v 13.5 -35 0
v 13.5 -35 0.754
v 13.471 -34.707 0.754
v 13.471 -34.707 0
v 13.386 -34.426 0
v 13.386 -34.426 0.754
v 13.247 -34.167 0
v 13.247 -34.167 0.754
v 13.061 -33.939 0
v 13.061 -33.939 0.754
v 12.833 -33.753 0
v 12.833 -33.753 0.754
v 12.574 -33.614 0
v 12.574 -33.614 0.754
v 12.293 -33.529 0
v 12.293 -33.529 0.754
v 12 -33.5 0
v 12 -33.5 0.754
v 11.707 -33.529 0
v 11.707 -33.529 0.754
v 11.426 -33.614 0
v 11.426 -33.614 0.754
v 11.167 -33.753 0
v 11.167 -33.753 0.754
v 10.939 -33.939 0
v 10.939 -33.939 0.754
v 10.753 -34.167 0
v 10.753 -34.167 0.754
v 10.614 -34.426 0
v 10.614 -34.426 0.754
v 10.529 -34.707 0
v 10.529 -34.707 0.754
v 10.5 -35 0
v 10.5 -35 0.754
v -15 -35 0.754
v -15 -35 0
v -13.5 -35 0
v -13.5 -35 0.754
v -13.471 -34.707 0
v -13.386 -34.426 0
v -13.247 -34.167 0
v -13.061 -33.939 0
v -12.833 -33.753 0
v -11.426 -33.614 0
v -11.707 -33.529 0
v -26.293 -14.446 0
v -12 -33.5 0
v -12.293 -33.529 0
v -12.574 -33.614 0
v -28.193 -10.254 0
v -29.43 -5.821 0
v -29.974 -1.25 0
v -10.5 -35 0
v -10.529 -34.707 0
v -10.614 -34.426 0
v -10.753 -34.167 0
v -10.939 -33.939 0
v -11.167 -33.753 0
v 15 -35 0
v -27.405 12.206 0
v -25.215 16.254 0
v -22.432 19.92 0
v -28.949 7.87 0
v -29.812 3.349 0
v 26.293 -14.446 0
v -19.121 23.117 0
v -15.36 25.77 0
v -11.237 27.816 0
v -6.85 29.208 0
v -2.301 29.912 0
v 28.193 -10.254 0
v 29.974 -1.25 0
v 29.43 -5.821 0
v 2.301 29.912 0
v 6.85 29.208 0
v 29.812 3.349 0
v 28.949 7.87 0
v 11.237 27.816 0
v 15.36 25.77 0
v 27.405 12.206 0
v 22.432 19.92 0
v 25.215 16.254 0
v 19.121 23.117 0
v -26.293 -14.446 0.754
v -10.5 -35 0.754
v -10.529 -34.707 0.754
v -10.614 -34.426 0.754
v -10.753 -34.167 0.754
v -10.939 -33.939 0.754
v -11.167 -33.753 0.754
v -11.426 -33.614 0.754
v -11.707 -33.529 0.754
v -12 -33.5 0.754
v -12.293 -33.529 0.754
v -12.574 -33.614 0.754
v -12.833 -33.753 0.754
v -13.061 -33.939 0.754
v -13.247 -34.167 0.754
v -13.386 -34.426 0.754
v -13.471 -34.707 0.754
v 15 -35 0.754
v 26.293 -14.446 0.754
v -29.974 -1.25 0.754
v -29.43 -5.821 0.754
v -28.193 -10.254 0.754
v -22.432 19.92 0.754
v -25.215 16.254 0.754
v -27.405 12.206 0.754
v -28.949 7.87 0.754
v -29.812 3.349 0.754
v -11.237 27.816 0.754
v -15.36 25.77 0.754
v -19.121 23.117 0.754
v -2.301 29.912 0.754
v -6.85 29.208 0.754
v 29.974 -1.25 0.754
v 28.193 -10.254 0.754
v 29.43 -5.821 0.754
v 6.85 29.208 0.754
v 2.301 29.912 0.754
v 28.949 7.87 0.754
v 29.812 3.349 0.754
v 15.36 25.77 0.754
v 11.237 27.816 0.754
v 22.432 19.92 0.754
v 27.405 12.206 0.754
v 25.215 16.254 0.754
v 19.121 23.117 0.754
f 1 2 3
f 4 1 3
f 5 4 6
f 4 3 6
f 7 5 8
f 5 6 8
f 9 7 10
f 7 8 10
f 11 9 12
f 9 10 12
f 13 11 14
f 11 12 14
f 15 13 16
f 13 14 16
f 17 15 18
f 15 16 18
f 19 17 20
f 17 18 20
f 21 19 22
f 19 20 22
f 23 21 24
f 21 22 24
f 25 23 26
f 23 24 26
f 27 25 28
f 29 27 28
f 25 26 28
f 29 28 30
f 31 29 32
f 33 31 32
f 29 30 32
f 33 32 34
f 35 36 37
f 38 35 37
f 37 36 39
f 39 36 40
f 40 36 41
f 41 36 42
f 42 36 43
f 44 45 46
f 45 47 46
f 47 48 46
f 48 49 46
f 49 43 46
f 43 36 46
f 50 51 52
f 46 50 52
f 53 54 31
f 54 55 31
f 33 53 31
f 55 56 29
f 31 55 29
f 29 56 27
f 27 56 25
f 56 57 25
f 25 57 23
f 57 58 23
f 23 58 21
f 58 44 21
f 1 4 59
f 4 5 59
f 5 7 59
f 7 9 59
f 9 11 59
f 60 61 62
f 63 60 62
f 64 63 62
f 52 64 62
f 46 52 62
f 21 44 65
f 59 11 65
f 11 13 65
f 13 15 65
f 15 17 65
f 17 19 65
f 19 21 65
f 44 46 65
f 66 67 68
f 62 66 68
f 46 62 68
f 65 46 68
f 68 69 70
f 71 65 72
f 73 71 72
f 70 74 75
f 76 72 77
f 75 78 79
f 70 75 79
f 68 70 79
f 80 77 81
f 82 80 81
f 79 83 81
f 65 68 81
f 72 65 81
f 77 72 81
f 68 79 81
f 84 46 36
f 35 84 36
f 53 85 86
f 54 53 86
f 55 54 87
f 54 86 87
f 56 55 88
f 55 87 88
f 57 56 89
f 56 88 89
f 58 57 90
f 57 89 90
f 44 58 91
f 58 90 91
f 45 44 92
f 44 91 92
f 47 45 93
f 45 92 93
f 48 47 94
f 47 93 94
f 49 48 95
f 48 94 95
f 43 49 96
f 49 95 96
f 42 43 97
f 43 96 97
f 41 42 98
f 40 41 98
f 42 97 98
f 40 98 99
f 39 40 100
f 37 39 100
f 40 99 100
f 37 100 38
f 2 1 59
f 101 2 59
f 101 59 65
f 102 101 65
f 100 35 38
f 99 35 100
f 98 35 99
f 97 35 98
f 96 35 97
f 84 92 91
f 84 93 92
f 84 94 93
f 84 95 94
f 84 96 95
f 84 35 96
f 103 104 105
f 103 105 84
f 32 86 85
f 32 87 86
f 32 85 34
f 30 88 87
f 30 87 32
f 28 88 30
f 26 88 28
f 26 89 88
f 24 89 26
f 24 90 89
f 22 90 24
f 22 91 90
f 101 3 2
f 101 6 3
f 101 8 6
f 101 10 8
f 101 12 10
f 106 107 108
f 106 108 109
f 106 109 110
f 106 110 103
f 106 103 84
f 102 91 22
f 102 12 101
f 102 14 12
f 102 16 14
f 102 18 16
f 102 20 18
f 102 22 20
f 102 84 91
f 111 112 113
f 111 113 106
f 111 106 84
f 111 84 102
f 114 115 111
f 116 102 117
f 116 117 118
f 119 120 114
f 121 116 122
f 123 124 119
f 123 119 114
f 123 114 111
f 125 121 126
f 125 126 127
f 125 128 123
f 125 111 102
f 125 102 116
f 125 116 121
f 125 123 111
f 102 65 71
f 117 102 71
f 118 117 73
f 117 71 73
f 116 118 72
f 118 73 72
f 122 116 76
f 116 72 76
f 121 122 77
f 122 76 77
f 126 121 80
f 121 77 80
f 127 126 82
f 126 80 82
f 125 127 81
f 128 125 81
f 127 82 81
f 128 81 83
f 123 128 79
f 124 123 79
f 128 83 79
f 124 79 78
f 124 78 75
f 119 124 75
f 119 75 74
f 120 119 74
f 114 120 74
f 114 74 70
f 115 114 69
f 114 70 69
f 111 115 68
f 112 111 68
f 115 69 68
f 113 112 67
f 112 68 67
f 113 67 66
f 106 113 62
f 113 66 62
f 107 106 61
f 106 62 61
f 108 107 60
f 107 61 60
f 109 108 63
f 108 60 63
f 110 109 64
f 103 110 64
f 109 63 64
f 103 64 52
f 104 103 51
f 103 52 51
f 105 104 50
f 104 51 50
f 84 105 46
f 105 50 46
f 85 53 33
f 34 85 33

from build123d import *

# Parameters (mm, degrees)
BOSS_EXTRUDE1_DEPTH   = 0.75438
CORTE_EXTRUS_O1_DEPTH = 10


with BuildPart() as part:
    # Sketch1 → Boss-Extrude1 (new body)
    with BuildSketch(Plane.XY):
        with BuildLine():
            Line((-26.292884648, -14.44590658), (-15, -35))
            Line((-15, -35), (-7.5, -35))
            Line((-7.5, -35), (15, -35))
            Line((15, -35), (26.292884648, -14.44590658))
            ThreePointArc((26.292884648, -14.44590658), (0, 30), (-26.292884648, -14.44590658))
        make_face()
    extrude(amount=BOSS_EXTRUDE1_DEPTH)

    # Esboço1 → Corte-extrusão1 (cut)
    with BuildSketch(Plane.XY.offset(0.75438)):
        with BuildLine():
            ThreePointArc((13.5, -35), (12, -33.5), (10.5, -35))
            Line((10.5, -35), (13.5, -35))
        make_face()
        with BuildLine():
            Line((13.5, -35), (10.5, -35))
            ThreePointArc((10.5, -35), (12, -36.5), (13.5, -35))
        make_face()
        with BuildLine():
            ThreePointArc((-10.5, -35), (-12, -33.5), (-13.5, -35))
            Line((-13.5, -35), (-12, -35))
            Line((-12, -35), (-10.5, -35))
        make_face()
        with BuildLine():
            Line((-12, -35), (-13.5, -35))
            ThreePointArc((-13.5, -35), (-12, -36.5), (-10.5, -35))
            Line((-10.5, -35), (-12, -35))
        make_face()
    extrude(amount=-CORTE_EXTRUS_O1_DEPTH, mode=Mode.SUBTRACT)


solid = part.part
